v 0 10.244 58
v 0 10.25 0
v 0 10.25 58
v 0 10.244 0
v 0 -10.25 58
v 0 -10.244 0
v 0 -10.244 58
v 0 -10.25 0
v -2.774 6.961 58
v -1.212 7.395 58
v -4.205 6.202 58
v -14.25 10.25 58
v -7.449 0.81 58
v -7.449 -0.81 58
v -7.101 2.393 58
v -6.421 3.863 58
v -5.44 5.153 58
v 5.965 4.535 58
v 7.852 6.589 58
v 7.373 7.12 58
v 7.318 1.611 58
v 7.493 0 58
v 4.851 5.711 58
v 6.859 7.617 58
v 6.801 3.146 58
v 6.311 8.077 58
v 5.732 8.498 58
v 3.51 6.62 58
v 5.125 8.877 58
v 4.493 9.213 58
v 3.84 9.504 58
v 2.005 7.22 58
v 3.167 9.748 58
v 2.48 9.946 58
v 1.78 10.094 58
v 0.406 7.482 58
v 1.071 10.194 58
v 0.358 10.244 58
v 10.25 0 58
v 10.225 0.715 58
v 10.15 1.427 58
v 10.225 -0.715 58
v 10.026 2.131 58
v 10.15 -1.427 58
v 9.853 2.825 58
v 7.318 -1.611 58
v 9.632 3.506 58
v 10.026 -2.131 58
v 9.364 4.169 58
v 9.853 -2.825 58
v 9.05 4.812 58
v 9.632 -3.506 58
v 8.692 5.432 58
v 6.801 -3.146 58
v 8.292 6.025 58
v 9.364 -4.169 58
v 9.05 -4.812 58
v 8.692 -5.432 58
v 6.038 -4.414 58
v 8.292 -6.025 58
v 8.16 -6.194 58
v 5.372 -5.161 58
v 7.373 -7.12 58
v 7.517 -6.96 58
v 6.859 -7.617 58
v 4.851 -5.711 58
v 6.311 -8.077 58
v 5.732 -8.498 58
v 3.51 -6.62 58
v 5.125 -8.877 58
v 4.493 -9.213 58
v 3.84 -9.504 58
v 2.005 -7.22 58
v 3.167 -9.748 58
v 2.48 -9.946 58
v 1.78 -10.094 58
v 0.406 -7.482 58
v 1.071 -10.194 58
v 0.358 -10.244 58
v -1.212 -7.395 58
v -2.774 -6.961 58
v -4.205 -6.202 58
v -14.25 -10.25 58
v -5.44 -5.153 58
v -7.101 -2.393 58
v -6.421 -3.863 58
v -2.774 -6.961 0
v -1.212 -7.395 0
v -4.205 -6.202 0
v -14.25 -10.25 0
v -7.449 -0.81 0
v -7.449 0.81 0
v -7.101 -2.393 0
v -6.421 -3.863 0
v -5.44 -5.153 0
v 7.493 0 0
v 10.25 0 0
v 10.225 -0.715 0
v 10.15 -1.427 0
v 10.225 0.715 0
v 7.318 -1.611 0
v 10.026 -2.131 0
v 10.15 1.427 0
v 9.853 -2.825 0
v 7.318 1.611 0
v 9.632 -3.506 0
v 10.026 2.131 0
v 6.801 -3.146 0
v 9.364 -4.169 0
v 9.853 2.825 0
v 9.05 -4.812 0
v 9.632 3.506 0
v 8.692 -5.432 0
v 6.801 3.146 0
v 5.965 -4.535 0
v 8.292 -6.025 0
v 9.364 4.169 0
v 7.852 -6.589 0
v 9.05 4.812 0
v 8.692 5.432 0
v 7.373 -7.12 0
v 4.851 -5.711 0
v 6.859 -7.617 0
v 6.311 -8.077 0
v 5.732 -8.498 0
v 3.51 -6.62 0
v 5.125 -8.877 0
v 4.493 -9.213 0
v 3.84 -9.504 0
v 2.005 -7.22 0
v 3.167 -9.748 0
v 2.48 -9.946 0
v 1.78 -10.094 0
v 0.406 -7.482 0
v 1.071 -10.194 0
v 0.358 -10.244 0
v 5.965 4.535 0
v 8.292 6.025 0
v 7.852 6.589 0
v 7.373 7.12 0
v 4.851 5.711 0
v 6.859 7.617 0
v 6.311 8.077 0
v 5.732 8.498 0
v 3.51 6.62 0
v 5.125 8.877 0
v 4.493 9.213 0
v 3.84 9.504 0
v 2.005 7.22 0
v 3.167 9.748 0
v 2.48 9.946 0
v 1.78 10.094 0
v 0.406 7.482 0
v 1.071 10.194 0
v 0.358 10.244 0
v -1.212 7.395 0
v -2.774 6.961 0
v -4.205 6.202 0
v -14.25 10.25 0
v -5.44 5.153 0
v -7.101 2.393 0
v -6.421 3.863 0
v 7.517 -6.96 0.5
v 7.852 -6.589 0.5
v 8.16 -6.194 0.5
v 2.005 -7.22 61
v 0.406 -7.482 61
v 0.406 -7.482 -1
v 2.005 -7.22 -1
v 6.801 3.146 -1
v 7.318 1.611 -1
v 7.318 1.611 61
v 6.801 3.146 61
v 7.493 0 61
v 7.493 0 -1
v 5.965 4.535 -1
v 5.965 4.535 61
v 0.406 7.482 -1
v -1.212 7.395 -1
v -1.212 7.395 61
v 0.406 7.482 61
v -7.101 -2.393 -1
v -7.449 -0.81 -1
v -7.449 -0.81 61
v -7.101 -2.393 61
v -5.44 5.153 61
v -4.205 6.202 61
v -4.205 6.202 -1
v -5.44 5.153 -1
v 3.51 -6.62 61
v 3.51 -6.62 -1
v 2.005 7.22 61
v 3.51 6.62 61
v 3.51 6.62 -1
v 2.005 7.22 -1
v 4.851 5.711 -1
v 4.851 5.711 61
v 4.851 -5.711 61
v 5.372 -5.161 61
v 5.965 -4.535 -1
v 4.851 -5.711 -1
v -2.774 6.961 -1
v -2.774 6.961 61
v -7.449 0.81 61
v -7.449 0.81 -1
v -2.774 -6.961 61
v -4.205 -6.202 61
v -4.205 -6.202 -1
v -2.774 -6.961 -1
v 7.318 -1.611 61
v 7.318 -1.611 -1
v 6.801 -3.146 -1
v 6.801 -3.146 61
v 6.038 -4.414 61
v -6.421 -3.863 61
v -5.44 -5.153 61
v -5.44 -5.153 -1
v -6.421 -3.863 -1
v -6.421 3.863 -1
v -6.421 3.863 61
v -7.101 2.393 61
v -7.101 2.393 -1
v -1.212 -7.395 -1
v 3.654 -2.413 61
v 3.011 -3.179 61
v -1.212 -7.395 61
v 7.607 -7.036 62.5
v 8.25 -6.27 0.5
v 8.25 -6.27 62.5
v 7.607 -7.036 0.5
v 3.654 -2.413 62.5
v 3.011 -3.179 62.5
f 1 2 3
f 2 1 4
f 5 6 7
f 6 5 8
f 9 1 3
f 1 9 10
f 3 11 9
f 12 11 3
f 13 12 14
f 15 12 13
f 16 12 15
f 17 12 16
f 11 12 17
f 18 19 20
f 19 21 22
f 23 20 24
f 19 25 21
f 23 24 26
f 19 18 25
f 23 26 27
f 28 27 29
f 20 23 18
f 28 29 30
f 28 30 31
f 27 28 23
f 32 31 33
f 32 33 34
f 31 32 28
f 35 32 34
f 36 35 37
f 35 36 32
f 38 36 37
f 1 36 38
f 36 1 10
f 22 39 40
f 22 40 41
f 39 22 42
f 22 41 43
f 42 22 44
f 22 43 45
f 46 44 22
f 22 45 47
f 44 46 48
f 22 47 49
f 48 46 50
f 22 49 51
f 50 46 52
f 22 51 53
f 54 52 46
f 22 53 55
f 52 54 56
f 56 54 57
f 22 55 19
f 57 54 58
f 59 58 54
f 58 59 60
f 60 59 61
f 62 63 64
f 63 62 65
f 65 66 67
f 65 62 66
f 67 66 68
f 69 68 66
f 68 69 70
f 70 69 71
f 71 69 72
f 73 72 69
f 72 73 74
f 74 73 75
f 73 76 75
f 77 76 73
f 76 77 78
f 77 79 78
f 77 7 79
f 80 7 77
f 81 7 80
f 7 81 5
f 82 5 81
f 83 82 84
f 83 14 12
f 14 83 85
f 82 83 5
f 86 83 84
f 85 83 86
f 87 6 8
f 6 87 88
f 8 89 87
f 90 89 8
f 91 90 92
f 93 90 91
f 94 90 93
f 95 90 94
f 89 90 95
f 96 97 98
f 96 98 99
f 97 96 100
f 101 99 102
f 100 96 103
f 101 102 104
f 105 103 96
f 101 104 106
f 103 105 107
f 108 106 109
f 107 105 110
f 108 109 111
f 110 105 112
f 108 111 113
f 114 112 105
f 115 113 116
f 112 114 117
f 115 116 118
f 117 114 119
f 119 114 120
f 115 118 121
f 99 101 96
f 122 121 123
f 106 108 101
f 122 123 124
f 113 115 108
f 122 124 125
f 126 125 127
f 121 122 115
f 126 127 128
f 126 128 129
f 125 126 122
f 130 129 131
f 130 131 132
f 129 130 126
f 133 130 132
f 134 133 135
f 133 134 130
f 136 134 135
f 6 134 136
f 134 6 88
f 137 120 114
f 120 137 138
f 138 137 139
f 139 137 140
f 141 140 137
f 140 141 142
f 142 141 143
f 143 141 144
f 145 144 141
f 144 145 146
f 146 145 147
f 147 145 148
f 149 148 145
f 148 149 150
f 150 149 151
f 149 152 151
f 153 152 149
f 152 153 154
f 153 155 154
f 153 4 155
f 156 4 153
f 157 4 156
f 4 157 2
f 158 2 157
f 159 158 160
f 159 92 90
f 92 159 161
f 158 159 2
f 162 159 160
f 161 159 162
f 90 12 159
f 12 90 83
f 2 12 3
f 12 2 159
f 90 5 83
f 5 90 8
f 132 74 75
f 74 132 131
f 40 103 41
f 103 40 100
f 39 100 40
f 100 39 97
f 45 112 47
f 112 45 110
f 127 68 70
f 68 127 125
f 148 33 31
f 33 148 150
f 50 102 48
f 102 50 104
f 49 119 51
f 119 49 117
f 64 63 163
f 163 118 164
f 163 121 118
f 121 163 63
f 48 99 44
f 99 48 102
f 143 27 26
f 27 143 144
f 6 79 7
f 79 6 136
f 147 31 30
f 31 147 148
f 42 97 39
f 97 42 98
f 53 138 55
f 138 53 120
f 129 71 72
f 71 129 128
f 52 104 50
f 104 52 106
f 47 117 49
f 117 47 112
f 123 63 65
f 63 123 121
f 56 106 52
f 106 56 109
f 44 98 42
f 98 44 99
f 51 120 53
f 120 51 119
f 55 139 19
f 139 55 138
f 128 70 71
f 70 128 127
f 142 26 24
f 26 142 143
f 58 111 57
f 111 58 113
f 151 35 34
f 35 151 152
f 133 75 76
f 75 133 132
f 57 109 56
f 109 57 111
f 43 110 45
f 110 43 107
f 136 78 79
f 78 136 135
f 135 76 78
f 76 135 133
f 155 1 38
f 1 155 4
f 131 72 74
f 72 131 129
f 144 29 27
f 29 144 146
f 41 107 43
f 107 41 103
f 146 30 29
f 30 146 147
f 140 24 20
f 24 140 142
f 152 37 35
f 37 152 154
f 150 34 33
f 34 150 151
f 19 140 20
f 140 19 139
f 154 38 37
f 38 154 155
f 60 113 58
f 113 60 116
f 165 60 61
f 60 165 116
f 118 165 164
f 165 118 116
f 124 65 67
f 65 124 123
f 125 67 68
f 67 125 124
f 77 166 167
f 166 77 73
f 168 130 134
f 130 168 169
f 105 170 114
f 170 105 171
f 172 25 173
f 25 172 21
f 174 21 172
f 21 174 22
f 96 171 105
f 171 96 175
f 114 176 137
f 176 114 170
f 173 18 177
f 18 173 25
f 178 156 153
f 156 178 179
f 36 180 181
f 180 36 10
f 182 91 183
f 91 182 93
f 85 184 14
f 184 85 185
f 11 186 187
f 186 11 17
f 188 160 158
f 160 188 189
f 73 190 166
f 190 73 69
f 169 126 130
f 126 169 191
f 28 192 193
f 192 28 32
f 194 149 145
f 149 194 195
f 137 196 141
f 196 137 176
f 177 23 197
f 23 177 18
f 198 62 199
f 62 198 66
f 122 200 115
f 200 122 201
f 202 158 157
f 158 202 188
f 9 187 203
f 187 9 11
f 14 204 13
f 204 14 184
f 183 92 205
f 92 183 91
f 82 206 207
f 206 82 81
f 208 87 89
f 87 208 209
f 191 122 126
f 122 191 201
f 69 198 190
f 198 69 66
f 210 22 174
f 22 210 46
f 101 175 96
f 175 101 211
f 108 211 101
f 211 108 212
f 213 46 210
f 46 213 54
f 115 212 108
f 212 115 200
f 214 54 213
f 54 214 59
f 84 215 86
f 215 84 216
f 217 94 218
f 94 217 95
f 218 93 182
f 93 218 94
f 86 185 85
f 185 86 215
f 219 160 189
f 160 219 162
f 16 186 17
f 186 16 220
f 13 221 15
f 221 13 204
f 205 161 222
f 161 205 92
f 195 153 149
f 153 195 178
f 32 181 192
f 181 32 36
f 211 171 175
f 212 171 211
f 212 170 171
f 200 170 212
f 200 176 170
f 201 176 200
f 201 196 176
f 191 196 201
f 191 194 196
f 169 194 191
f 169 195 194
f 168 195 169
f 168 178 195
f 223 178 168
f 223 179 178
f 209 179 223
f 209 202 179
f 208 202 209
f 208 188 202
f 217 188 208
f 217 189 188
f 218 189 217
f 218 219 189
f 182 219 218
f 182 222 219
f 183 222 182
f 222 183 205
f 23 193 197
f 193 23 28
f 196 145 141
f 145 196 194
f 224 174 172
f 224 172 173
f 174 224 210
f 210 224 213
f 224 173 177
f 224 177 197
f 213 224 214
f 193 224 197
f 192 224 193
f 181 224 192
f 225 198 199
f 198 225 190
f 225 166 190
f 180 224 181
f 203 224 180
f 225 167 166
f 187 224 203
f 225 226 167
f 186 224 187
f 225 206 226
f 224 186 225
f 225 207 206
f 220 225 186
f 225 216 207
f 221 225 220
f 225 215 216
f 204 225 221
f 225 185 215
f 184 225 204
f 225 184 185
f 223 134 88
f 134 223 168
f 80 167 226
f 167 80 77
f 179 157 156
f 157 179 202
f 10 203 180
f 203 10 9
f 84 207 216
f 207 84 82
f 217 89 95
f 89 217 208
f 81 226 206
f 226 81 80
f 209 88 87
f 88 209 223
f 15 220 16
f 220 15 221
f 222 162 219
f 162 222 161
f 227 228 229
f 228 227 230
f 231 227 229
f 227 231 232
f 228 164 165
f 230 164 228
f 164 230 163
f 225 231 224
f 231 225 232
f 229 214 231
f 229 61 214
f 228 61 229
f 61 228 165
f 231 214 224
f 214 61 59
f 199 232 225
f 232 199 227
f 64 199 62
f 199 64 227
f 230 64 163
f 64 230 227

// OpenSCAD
// file: polyholes.scad
//Original Prusa

//
// Mendel90
//
// GNU GPL v2
// nop.head@gmail.com
// hydraraptor.blogspot.com
//
// See http://hydraraptor.blogspot.com/2011/02/polyholes.html
//
function sides(r) = max(round(4 *r),3);
function correctedRadius(r,n) = 0.1 + r / cos(180 / n);
function correctedDiameter(d) = 0.2 + d / cos(180 / sides(d / 2));

module polyCircle(r, center = false) {
    n = sides(r);
    circle(r = correctedRadius(r,n), $fn = n, center = center);
}

module poly_circle(r, center = false) {
	polyCircle(r, center);
}

module polyCylinder(r, h, center = false) {
    n = sides(r);
    cylinder(h = h, r = correctedRadius(r,n), $fn = n, center = center);
}

module poly_cylinder(r, h, center = false) {
	polyCylinder(r,h,center);
}

module polydCylinder(r, center = false) {
    n = sides(r);
    r = correctedRadius(r,n);
    cylinder(h = h, r = r, $fn = n, center = center);
    translate([0, -r, 0])
        cube([r, 2 * r, h]);
}

module poly_d_cylinder(r, center = false) {
	polydCylinder(r,center);
}
// main file
//Original Prusa

// PRUSA iteration3
// Bearing holders
// GNU GPL v3
// Josef Průša <iam@josefprusa.cz> and contributors
// http://www.reprap.org/wiki/Prusa_Mendel
// http://prusamendel.org

use <polyholes.scad>

bearing_diameter = 14.5;

module horizontal_bearing_base(bearings=1){
 translate(v=[0,0,6]) cube(size = [24,8+bearings*25,12], center = true);	
}
module horizontal_bearing_holes(bearings=1){
 cutter_lenght = 10+bearings*25;
 one_holder_lenght = 8+25;
 holder_lenght = 8+bearings*25;
 
 // Main bearing cut
 difference(){
  translate(v=[0,0,12]) rotate(a=[90,0,0]) translate(v=[0,0,-cutter_lenght/2]) cylinder(h = cutter_lenght, r=(bearing_diameter/2)+0.2, $fn=50);
  // Bearing retainers
  translate(v=[0,1-holder_lenght/2,3]) cube(size = [24,6,8], center = true);
  translate(v=[0,-1+holder_lenght/2,3]) cube(size = [24,6,8], center = true);
 }
 
 // Ziptie cutouts
 ziptie_cut_ofset = 0;
 for ( i = [0 : bearings-1] ){
  // For easier positioning I move them by half of one 
  // bearing holder then add each bearign lenght and then center again
  translate(v=[0,-holder_lenght/2,0]) translate(v=[0,one_holder_lenght/2+i*25,0]) difference(){
   union(){
    translate(v=[0,2-8.5,12]) rotate(a=[90,0,0]) translate(v=[0,0,0]) cylinder(h = 4, r=11.5, $fn=50);
    translate(v=[0,2+8.5,12]) rotate(a=[90,0,0]) translate(v=[0,0,0]) cylinder(h = 4, r=11.5, $fn=50);
   }
   translate(v=[0,12,12]) rotate(a=[90,0,0]) translate(v=[0,0,0]) cylinder(h = 24, r=9, $fn=50);
  }
 }
 
}

module horizontal_bearing_test(){
 difference(){
  horizontal_bearing_base(1);
  horizontal_bearing_holes(1);
 }
 translate(v=[30,0,0]) difference(){
  horizontal_bearing_base(2);
  #horizontal_bearing_holes(2);
 }
 translate(v=[60,0,0]) difference(){
  horizontal_bearing_base(3);
  horizontal_bearing_holes(3);
 }
}



thinwall = 3;
bearing_size = bearing_diameter + 2 * thinwall;

module vertical_bearing_base(){
 translate(v=[-2-bearing_size/4,0,29]) cube(size = [4+bearing_size/2,bearing_size,58], center = true);
 cylinder(h = 58, r=bearing_size/2, $fn = 90);
}

module vertical_bearing_holes(){
  translate(v=[0,0,-1]) poly_cylinder(h = 62, r=(bearing_diameter/2)+0.1);
  rotate(a=[0,0,-40]) translate(v=[bearing_diameter/2-2.9,-0.5,0.5]) cube(size = [thinwall*2,1,62]);

}

//difference(){
vertical_bearing_base();
vertical_bearing_holes();
//}
//horizontal_bearing_test();
//horizontal_bearing_base(1);
//horizontal_bearing_holes(1);
